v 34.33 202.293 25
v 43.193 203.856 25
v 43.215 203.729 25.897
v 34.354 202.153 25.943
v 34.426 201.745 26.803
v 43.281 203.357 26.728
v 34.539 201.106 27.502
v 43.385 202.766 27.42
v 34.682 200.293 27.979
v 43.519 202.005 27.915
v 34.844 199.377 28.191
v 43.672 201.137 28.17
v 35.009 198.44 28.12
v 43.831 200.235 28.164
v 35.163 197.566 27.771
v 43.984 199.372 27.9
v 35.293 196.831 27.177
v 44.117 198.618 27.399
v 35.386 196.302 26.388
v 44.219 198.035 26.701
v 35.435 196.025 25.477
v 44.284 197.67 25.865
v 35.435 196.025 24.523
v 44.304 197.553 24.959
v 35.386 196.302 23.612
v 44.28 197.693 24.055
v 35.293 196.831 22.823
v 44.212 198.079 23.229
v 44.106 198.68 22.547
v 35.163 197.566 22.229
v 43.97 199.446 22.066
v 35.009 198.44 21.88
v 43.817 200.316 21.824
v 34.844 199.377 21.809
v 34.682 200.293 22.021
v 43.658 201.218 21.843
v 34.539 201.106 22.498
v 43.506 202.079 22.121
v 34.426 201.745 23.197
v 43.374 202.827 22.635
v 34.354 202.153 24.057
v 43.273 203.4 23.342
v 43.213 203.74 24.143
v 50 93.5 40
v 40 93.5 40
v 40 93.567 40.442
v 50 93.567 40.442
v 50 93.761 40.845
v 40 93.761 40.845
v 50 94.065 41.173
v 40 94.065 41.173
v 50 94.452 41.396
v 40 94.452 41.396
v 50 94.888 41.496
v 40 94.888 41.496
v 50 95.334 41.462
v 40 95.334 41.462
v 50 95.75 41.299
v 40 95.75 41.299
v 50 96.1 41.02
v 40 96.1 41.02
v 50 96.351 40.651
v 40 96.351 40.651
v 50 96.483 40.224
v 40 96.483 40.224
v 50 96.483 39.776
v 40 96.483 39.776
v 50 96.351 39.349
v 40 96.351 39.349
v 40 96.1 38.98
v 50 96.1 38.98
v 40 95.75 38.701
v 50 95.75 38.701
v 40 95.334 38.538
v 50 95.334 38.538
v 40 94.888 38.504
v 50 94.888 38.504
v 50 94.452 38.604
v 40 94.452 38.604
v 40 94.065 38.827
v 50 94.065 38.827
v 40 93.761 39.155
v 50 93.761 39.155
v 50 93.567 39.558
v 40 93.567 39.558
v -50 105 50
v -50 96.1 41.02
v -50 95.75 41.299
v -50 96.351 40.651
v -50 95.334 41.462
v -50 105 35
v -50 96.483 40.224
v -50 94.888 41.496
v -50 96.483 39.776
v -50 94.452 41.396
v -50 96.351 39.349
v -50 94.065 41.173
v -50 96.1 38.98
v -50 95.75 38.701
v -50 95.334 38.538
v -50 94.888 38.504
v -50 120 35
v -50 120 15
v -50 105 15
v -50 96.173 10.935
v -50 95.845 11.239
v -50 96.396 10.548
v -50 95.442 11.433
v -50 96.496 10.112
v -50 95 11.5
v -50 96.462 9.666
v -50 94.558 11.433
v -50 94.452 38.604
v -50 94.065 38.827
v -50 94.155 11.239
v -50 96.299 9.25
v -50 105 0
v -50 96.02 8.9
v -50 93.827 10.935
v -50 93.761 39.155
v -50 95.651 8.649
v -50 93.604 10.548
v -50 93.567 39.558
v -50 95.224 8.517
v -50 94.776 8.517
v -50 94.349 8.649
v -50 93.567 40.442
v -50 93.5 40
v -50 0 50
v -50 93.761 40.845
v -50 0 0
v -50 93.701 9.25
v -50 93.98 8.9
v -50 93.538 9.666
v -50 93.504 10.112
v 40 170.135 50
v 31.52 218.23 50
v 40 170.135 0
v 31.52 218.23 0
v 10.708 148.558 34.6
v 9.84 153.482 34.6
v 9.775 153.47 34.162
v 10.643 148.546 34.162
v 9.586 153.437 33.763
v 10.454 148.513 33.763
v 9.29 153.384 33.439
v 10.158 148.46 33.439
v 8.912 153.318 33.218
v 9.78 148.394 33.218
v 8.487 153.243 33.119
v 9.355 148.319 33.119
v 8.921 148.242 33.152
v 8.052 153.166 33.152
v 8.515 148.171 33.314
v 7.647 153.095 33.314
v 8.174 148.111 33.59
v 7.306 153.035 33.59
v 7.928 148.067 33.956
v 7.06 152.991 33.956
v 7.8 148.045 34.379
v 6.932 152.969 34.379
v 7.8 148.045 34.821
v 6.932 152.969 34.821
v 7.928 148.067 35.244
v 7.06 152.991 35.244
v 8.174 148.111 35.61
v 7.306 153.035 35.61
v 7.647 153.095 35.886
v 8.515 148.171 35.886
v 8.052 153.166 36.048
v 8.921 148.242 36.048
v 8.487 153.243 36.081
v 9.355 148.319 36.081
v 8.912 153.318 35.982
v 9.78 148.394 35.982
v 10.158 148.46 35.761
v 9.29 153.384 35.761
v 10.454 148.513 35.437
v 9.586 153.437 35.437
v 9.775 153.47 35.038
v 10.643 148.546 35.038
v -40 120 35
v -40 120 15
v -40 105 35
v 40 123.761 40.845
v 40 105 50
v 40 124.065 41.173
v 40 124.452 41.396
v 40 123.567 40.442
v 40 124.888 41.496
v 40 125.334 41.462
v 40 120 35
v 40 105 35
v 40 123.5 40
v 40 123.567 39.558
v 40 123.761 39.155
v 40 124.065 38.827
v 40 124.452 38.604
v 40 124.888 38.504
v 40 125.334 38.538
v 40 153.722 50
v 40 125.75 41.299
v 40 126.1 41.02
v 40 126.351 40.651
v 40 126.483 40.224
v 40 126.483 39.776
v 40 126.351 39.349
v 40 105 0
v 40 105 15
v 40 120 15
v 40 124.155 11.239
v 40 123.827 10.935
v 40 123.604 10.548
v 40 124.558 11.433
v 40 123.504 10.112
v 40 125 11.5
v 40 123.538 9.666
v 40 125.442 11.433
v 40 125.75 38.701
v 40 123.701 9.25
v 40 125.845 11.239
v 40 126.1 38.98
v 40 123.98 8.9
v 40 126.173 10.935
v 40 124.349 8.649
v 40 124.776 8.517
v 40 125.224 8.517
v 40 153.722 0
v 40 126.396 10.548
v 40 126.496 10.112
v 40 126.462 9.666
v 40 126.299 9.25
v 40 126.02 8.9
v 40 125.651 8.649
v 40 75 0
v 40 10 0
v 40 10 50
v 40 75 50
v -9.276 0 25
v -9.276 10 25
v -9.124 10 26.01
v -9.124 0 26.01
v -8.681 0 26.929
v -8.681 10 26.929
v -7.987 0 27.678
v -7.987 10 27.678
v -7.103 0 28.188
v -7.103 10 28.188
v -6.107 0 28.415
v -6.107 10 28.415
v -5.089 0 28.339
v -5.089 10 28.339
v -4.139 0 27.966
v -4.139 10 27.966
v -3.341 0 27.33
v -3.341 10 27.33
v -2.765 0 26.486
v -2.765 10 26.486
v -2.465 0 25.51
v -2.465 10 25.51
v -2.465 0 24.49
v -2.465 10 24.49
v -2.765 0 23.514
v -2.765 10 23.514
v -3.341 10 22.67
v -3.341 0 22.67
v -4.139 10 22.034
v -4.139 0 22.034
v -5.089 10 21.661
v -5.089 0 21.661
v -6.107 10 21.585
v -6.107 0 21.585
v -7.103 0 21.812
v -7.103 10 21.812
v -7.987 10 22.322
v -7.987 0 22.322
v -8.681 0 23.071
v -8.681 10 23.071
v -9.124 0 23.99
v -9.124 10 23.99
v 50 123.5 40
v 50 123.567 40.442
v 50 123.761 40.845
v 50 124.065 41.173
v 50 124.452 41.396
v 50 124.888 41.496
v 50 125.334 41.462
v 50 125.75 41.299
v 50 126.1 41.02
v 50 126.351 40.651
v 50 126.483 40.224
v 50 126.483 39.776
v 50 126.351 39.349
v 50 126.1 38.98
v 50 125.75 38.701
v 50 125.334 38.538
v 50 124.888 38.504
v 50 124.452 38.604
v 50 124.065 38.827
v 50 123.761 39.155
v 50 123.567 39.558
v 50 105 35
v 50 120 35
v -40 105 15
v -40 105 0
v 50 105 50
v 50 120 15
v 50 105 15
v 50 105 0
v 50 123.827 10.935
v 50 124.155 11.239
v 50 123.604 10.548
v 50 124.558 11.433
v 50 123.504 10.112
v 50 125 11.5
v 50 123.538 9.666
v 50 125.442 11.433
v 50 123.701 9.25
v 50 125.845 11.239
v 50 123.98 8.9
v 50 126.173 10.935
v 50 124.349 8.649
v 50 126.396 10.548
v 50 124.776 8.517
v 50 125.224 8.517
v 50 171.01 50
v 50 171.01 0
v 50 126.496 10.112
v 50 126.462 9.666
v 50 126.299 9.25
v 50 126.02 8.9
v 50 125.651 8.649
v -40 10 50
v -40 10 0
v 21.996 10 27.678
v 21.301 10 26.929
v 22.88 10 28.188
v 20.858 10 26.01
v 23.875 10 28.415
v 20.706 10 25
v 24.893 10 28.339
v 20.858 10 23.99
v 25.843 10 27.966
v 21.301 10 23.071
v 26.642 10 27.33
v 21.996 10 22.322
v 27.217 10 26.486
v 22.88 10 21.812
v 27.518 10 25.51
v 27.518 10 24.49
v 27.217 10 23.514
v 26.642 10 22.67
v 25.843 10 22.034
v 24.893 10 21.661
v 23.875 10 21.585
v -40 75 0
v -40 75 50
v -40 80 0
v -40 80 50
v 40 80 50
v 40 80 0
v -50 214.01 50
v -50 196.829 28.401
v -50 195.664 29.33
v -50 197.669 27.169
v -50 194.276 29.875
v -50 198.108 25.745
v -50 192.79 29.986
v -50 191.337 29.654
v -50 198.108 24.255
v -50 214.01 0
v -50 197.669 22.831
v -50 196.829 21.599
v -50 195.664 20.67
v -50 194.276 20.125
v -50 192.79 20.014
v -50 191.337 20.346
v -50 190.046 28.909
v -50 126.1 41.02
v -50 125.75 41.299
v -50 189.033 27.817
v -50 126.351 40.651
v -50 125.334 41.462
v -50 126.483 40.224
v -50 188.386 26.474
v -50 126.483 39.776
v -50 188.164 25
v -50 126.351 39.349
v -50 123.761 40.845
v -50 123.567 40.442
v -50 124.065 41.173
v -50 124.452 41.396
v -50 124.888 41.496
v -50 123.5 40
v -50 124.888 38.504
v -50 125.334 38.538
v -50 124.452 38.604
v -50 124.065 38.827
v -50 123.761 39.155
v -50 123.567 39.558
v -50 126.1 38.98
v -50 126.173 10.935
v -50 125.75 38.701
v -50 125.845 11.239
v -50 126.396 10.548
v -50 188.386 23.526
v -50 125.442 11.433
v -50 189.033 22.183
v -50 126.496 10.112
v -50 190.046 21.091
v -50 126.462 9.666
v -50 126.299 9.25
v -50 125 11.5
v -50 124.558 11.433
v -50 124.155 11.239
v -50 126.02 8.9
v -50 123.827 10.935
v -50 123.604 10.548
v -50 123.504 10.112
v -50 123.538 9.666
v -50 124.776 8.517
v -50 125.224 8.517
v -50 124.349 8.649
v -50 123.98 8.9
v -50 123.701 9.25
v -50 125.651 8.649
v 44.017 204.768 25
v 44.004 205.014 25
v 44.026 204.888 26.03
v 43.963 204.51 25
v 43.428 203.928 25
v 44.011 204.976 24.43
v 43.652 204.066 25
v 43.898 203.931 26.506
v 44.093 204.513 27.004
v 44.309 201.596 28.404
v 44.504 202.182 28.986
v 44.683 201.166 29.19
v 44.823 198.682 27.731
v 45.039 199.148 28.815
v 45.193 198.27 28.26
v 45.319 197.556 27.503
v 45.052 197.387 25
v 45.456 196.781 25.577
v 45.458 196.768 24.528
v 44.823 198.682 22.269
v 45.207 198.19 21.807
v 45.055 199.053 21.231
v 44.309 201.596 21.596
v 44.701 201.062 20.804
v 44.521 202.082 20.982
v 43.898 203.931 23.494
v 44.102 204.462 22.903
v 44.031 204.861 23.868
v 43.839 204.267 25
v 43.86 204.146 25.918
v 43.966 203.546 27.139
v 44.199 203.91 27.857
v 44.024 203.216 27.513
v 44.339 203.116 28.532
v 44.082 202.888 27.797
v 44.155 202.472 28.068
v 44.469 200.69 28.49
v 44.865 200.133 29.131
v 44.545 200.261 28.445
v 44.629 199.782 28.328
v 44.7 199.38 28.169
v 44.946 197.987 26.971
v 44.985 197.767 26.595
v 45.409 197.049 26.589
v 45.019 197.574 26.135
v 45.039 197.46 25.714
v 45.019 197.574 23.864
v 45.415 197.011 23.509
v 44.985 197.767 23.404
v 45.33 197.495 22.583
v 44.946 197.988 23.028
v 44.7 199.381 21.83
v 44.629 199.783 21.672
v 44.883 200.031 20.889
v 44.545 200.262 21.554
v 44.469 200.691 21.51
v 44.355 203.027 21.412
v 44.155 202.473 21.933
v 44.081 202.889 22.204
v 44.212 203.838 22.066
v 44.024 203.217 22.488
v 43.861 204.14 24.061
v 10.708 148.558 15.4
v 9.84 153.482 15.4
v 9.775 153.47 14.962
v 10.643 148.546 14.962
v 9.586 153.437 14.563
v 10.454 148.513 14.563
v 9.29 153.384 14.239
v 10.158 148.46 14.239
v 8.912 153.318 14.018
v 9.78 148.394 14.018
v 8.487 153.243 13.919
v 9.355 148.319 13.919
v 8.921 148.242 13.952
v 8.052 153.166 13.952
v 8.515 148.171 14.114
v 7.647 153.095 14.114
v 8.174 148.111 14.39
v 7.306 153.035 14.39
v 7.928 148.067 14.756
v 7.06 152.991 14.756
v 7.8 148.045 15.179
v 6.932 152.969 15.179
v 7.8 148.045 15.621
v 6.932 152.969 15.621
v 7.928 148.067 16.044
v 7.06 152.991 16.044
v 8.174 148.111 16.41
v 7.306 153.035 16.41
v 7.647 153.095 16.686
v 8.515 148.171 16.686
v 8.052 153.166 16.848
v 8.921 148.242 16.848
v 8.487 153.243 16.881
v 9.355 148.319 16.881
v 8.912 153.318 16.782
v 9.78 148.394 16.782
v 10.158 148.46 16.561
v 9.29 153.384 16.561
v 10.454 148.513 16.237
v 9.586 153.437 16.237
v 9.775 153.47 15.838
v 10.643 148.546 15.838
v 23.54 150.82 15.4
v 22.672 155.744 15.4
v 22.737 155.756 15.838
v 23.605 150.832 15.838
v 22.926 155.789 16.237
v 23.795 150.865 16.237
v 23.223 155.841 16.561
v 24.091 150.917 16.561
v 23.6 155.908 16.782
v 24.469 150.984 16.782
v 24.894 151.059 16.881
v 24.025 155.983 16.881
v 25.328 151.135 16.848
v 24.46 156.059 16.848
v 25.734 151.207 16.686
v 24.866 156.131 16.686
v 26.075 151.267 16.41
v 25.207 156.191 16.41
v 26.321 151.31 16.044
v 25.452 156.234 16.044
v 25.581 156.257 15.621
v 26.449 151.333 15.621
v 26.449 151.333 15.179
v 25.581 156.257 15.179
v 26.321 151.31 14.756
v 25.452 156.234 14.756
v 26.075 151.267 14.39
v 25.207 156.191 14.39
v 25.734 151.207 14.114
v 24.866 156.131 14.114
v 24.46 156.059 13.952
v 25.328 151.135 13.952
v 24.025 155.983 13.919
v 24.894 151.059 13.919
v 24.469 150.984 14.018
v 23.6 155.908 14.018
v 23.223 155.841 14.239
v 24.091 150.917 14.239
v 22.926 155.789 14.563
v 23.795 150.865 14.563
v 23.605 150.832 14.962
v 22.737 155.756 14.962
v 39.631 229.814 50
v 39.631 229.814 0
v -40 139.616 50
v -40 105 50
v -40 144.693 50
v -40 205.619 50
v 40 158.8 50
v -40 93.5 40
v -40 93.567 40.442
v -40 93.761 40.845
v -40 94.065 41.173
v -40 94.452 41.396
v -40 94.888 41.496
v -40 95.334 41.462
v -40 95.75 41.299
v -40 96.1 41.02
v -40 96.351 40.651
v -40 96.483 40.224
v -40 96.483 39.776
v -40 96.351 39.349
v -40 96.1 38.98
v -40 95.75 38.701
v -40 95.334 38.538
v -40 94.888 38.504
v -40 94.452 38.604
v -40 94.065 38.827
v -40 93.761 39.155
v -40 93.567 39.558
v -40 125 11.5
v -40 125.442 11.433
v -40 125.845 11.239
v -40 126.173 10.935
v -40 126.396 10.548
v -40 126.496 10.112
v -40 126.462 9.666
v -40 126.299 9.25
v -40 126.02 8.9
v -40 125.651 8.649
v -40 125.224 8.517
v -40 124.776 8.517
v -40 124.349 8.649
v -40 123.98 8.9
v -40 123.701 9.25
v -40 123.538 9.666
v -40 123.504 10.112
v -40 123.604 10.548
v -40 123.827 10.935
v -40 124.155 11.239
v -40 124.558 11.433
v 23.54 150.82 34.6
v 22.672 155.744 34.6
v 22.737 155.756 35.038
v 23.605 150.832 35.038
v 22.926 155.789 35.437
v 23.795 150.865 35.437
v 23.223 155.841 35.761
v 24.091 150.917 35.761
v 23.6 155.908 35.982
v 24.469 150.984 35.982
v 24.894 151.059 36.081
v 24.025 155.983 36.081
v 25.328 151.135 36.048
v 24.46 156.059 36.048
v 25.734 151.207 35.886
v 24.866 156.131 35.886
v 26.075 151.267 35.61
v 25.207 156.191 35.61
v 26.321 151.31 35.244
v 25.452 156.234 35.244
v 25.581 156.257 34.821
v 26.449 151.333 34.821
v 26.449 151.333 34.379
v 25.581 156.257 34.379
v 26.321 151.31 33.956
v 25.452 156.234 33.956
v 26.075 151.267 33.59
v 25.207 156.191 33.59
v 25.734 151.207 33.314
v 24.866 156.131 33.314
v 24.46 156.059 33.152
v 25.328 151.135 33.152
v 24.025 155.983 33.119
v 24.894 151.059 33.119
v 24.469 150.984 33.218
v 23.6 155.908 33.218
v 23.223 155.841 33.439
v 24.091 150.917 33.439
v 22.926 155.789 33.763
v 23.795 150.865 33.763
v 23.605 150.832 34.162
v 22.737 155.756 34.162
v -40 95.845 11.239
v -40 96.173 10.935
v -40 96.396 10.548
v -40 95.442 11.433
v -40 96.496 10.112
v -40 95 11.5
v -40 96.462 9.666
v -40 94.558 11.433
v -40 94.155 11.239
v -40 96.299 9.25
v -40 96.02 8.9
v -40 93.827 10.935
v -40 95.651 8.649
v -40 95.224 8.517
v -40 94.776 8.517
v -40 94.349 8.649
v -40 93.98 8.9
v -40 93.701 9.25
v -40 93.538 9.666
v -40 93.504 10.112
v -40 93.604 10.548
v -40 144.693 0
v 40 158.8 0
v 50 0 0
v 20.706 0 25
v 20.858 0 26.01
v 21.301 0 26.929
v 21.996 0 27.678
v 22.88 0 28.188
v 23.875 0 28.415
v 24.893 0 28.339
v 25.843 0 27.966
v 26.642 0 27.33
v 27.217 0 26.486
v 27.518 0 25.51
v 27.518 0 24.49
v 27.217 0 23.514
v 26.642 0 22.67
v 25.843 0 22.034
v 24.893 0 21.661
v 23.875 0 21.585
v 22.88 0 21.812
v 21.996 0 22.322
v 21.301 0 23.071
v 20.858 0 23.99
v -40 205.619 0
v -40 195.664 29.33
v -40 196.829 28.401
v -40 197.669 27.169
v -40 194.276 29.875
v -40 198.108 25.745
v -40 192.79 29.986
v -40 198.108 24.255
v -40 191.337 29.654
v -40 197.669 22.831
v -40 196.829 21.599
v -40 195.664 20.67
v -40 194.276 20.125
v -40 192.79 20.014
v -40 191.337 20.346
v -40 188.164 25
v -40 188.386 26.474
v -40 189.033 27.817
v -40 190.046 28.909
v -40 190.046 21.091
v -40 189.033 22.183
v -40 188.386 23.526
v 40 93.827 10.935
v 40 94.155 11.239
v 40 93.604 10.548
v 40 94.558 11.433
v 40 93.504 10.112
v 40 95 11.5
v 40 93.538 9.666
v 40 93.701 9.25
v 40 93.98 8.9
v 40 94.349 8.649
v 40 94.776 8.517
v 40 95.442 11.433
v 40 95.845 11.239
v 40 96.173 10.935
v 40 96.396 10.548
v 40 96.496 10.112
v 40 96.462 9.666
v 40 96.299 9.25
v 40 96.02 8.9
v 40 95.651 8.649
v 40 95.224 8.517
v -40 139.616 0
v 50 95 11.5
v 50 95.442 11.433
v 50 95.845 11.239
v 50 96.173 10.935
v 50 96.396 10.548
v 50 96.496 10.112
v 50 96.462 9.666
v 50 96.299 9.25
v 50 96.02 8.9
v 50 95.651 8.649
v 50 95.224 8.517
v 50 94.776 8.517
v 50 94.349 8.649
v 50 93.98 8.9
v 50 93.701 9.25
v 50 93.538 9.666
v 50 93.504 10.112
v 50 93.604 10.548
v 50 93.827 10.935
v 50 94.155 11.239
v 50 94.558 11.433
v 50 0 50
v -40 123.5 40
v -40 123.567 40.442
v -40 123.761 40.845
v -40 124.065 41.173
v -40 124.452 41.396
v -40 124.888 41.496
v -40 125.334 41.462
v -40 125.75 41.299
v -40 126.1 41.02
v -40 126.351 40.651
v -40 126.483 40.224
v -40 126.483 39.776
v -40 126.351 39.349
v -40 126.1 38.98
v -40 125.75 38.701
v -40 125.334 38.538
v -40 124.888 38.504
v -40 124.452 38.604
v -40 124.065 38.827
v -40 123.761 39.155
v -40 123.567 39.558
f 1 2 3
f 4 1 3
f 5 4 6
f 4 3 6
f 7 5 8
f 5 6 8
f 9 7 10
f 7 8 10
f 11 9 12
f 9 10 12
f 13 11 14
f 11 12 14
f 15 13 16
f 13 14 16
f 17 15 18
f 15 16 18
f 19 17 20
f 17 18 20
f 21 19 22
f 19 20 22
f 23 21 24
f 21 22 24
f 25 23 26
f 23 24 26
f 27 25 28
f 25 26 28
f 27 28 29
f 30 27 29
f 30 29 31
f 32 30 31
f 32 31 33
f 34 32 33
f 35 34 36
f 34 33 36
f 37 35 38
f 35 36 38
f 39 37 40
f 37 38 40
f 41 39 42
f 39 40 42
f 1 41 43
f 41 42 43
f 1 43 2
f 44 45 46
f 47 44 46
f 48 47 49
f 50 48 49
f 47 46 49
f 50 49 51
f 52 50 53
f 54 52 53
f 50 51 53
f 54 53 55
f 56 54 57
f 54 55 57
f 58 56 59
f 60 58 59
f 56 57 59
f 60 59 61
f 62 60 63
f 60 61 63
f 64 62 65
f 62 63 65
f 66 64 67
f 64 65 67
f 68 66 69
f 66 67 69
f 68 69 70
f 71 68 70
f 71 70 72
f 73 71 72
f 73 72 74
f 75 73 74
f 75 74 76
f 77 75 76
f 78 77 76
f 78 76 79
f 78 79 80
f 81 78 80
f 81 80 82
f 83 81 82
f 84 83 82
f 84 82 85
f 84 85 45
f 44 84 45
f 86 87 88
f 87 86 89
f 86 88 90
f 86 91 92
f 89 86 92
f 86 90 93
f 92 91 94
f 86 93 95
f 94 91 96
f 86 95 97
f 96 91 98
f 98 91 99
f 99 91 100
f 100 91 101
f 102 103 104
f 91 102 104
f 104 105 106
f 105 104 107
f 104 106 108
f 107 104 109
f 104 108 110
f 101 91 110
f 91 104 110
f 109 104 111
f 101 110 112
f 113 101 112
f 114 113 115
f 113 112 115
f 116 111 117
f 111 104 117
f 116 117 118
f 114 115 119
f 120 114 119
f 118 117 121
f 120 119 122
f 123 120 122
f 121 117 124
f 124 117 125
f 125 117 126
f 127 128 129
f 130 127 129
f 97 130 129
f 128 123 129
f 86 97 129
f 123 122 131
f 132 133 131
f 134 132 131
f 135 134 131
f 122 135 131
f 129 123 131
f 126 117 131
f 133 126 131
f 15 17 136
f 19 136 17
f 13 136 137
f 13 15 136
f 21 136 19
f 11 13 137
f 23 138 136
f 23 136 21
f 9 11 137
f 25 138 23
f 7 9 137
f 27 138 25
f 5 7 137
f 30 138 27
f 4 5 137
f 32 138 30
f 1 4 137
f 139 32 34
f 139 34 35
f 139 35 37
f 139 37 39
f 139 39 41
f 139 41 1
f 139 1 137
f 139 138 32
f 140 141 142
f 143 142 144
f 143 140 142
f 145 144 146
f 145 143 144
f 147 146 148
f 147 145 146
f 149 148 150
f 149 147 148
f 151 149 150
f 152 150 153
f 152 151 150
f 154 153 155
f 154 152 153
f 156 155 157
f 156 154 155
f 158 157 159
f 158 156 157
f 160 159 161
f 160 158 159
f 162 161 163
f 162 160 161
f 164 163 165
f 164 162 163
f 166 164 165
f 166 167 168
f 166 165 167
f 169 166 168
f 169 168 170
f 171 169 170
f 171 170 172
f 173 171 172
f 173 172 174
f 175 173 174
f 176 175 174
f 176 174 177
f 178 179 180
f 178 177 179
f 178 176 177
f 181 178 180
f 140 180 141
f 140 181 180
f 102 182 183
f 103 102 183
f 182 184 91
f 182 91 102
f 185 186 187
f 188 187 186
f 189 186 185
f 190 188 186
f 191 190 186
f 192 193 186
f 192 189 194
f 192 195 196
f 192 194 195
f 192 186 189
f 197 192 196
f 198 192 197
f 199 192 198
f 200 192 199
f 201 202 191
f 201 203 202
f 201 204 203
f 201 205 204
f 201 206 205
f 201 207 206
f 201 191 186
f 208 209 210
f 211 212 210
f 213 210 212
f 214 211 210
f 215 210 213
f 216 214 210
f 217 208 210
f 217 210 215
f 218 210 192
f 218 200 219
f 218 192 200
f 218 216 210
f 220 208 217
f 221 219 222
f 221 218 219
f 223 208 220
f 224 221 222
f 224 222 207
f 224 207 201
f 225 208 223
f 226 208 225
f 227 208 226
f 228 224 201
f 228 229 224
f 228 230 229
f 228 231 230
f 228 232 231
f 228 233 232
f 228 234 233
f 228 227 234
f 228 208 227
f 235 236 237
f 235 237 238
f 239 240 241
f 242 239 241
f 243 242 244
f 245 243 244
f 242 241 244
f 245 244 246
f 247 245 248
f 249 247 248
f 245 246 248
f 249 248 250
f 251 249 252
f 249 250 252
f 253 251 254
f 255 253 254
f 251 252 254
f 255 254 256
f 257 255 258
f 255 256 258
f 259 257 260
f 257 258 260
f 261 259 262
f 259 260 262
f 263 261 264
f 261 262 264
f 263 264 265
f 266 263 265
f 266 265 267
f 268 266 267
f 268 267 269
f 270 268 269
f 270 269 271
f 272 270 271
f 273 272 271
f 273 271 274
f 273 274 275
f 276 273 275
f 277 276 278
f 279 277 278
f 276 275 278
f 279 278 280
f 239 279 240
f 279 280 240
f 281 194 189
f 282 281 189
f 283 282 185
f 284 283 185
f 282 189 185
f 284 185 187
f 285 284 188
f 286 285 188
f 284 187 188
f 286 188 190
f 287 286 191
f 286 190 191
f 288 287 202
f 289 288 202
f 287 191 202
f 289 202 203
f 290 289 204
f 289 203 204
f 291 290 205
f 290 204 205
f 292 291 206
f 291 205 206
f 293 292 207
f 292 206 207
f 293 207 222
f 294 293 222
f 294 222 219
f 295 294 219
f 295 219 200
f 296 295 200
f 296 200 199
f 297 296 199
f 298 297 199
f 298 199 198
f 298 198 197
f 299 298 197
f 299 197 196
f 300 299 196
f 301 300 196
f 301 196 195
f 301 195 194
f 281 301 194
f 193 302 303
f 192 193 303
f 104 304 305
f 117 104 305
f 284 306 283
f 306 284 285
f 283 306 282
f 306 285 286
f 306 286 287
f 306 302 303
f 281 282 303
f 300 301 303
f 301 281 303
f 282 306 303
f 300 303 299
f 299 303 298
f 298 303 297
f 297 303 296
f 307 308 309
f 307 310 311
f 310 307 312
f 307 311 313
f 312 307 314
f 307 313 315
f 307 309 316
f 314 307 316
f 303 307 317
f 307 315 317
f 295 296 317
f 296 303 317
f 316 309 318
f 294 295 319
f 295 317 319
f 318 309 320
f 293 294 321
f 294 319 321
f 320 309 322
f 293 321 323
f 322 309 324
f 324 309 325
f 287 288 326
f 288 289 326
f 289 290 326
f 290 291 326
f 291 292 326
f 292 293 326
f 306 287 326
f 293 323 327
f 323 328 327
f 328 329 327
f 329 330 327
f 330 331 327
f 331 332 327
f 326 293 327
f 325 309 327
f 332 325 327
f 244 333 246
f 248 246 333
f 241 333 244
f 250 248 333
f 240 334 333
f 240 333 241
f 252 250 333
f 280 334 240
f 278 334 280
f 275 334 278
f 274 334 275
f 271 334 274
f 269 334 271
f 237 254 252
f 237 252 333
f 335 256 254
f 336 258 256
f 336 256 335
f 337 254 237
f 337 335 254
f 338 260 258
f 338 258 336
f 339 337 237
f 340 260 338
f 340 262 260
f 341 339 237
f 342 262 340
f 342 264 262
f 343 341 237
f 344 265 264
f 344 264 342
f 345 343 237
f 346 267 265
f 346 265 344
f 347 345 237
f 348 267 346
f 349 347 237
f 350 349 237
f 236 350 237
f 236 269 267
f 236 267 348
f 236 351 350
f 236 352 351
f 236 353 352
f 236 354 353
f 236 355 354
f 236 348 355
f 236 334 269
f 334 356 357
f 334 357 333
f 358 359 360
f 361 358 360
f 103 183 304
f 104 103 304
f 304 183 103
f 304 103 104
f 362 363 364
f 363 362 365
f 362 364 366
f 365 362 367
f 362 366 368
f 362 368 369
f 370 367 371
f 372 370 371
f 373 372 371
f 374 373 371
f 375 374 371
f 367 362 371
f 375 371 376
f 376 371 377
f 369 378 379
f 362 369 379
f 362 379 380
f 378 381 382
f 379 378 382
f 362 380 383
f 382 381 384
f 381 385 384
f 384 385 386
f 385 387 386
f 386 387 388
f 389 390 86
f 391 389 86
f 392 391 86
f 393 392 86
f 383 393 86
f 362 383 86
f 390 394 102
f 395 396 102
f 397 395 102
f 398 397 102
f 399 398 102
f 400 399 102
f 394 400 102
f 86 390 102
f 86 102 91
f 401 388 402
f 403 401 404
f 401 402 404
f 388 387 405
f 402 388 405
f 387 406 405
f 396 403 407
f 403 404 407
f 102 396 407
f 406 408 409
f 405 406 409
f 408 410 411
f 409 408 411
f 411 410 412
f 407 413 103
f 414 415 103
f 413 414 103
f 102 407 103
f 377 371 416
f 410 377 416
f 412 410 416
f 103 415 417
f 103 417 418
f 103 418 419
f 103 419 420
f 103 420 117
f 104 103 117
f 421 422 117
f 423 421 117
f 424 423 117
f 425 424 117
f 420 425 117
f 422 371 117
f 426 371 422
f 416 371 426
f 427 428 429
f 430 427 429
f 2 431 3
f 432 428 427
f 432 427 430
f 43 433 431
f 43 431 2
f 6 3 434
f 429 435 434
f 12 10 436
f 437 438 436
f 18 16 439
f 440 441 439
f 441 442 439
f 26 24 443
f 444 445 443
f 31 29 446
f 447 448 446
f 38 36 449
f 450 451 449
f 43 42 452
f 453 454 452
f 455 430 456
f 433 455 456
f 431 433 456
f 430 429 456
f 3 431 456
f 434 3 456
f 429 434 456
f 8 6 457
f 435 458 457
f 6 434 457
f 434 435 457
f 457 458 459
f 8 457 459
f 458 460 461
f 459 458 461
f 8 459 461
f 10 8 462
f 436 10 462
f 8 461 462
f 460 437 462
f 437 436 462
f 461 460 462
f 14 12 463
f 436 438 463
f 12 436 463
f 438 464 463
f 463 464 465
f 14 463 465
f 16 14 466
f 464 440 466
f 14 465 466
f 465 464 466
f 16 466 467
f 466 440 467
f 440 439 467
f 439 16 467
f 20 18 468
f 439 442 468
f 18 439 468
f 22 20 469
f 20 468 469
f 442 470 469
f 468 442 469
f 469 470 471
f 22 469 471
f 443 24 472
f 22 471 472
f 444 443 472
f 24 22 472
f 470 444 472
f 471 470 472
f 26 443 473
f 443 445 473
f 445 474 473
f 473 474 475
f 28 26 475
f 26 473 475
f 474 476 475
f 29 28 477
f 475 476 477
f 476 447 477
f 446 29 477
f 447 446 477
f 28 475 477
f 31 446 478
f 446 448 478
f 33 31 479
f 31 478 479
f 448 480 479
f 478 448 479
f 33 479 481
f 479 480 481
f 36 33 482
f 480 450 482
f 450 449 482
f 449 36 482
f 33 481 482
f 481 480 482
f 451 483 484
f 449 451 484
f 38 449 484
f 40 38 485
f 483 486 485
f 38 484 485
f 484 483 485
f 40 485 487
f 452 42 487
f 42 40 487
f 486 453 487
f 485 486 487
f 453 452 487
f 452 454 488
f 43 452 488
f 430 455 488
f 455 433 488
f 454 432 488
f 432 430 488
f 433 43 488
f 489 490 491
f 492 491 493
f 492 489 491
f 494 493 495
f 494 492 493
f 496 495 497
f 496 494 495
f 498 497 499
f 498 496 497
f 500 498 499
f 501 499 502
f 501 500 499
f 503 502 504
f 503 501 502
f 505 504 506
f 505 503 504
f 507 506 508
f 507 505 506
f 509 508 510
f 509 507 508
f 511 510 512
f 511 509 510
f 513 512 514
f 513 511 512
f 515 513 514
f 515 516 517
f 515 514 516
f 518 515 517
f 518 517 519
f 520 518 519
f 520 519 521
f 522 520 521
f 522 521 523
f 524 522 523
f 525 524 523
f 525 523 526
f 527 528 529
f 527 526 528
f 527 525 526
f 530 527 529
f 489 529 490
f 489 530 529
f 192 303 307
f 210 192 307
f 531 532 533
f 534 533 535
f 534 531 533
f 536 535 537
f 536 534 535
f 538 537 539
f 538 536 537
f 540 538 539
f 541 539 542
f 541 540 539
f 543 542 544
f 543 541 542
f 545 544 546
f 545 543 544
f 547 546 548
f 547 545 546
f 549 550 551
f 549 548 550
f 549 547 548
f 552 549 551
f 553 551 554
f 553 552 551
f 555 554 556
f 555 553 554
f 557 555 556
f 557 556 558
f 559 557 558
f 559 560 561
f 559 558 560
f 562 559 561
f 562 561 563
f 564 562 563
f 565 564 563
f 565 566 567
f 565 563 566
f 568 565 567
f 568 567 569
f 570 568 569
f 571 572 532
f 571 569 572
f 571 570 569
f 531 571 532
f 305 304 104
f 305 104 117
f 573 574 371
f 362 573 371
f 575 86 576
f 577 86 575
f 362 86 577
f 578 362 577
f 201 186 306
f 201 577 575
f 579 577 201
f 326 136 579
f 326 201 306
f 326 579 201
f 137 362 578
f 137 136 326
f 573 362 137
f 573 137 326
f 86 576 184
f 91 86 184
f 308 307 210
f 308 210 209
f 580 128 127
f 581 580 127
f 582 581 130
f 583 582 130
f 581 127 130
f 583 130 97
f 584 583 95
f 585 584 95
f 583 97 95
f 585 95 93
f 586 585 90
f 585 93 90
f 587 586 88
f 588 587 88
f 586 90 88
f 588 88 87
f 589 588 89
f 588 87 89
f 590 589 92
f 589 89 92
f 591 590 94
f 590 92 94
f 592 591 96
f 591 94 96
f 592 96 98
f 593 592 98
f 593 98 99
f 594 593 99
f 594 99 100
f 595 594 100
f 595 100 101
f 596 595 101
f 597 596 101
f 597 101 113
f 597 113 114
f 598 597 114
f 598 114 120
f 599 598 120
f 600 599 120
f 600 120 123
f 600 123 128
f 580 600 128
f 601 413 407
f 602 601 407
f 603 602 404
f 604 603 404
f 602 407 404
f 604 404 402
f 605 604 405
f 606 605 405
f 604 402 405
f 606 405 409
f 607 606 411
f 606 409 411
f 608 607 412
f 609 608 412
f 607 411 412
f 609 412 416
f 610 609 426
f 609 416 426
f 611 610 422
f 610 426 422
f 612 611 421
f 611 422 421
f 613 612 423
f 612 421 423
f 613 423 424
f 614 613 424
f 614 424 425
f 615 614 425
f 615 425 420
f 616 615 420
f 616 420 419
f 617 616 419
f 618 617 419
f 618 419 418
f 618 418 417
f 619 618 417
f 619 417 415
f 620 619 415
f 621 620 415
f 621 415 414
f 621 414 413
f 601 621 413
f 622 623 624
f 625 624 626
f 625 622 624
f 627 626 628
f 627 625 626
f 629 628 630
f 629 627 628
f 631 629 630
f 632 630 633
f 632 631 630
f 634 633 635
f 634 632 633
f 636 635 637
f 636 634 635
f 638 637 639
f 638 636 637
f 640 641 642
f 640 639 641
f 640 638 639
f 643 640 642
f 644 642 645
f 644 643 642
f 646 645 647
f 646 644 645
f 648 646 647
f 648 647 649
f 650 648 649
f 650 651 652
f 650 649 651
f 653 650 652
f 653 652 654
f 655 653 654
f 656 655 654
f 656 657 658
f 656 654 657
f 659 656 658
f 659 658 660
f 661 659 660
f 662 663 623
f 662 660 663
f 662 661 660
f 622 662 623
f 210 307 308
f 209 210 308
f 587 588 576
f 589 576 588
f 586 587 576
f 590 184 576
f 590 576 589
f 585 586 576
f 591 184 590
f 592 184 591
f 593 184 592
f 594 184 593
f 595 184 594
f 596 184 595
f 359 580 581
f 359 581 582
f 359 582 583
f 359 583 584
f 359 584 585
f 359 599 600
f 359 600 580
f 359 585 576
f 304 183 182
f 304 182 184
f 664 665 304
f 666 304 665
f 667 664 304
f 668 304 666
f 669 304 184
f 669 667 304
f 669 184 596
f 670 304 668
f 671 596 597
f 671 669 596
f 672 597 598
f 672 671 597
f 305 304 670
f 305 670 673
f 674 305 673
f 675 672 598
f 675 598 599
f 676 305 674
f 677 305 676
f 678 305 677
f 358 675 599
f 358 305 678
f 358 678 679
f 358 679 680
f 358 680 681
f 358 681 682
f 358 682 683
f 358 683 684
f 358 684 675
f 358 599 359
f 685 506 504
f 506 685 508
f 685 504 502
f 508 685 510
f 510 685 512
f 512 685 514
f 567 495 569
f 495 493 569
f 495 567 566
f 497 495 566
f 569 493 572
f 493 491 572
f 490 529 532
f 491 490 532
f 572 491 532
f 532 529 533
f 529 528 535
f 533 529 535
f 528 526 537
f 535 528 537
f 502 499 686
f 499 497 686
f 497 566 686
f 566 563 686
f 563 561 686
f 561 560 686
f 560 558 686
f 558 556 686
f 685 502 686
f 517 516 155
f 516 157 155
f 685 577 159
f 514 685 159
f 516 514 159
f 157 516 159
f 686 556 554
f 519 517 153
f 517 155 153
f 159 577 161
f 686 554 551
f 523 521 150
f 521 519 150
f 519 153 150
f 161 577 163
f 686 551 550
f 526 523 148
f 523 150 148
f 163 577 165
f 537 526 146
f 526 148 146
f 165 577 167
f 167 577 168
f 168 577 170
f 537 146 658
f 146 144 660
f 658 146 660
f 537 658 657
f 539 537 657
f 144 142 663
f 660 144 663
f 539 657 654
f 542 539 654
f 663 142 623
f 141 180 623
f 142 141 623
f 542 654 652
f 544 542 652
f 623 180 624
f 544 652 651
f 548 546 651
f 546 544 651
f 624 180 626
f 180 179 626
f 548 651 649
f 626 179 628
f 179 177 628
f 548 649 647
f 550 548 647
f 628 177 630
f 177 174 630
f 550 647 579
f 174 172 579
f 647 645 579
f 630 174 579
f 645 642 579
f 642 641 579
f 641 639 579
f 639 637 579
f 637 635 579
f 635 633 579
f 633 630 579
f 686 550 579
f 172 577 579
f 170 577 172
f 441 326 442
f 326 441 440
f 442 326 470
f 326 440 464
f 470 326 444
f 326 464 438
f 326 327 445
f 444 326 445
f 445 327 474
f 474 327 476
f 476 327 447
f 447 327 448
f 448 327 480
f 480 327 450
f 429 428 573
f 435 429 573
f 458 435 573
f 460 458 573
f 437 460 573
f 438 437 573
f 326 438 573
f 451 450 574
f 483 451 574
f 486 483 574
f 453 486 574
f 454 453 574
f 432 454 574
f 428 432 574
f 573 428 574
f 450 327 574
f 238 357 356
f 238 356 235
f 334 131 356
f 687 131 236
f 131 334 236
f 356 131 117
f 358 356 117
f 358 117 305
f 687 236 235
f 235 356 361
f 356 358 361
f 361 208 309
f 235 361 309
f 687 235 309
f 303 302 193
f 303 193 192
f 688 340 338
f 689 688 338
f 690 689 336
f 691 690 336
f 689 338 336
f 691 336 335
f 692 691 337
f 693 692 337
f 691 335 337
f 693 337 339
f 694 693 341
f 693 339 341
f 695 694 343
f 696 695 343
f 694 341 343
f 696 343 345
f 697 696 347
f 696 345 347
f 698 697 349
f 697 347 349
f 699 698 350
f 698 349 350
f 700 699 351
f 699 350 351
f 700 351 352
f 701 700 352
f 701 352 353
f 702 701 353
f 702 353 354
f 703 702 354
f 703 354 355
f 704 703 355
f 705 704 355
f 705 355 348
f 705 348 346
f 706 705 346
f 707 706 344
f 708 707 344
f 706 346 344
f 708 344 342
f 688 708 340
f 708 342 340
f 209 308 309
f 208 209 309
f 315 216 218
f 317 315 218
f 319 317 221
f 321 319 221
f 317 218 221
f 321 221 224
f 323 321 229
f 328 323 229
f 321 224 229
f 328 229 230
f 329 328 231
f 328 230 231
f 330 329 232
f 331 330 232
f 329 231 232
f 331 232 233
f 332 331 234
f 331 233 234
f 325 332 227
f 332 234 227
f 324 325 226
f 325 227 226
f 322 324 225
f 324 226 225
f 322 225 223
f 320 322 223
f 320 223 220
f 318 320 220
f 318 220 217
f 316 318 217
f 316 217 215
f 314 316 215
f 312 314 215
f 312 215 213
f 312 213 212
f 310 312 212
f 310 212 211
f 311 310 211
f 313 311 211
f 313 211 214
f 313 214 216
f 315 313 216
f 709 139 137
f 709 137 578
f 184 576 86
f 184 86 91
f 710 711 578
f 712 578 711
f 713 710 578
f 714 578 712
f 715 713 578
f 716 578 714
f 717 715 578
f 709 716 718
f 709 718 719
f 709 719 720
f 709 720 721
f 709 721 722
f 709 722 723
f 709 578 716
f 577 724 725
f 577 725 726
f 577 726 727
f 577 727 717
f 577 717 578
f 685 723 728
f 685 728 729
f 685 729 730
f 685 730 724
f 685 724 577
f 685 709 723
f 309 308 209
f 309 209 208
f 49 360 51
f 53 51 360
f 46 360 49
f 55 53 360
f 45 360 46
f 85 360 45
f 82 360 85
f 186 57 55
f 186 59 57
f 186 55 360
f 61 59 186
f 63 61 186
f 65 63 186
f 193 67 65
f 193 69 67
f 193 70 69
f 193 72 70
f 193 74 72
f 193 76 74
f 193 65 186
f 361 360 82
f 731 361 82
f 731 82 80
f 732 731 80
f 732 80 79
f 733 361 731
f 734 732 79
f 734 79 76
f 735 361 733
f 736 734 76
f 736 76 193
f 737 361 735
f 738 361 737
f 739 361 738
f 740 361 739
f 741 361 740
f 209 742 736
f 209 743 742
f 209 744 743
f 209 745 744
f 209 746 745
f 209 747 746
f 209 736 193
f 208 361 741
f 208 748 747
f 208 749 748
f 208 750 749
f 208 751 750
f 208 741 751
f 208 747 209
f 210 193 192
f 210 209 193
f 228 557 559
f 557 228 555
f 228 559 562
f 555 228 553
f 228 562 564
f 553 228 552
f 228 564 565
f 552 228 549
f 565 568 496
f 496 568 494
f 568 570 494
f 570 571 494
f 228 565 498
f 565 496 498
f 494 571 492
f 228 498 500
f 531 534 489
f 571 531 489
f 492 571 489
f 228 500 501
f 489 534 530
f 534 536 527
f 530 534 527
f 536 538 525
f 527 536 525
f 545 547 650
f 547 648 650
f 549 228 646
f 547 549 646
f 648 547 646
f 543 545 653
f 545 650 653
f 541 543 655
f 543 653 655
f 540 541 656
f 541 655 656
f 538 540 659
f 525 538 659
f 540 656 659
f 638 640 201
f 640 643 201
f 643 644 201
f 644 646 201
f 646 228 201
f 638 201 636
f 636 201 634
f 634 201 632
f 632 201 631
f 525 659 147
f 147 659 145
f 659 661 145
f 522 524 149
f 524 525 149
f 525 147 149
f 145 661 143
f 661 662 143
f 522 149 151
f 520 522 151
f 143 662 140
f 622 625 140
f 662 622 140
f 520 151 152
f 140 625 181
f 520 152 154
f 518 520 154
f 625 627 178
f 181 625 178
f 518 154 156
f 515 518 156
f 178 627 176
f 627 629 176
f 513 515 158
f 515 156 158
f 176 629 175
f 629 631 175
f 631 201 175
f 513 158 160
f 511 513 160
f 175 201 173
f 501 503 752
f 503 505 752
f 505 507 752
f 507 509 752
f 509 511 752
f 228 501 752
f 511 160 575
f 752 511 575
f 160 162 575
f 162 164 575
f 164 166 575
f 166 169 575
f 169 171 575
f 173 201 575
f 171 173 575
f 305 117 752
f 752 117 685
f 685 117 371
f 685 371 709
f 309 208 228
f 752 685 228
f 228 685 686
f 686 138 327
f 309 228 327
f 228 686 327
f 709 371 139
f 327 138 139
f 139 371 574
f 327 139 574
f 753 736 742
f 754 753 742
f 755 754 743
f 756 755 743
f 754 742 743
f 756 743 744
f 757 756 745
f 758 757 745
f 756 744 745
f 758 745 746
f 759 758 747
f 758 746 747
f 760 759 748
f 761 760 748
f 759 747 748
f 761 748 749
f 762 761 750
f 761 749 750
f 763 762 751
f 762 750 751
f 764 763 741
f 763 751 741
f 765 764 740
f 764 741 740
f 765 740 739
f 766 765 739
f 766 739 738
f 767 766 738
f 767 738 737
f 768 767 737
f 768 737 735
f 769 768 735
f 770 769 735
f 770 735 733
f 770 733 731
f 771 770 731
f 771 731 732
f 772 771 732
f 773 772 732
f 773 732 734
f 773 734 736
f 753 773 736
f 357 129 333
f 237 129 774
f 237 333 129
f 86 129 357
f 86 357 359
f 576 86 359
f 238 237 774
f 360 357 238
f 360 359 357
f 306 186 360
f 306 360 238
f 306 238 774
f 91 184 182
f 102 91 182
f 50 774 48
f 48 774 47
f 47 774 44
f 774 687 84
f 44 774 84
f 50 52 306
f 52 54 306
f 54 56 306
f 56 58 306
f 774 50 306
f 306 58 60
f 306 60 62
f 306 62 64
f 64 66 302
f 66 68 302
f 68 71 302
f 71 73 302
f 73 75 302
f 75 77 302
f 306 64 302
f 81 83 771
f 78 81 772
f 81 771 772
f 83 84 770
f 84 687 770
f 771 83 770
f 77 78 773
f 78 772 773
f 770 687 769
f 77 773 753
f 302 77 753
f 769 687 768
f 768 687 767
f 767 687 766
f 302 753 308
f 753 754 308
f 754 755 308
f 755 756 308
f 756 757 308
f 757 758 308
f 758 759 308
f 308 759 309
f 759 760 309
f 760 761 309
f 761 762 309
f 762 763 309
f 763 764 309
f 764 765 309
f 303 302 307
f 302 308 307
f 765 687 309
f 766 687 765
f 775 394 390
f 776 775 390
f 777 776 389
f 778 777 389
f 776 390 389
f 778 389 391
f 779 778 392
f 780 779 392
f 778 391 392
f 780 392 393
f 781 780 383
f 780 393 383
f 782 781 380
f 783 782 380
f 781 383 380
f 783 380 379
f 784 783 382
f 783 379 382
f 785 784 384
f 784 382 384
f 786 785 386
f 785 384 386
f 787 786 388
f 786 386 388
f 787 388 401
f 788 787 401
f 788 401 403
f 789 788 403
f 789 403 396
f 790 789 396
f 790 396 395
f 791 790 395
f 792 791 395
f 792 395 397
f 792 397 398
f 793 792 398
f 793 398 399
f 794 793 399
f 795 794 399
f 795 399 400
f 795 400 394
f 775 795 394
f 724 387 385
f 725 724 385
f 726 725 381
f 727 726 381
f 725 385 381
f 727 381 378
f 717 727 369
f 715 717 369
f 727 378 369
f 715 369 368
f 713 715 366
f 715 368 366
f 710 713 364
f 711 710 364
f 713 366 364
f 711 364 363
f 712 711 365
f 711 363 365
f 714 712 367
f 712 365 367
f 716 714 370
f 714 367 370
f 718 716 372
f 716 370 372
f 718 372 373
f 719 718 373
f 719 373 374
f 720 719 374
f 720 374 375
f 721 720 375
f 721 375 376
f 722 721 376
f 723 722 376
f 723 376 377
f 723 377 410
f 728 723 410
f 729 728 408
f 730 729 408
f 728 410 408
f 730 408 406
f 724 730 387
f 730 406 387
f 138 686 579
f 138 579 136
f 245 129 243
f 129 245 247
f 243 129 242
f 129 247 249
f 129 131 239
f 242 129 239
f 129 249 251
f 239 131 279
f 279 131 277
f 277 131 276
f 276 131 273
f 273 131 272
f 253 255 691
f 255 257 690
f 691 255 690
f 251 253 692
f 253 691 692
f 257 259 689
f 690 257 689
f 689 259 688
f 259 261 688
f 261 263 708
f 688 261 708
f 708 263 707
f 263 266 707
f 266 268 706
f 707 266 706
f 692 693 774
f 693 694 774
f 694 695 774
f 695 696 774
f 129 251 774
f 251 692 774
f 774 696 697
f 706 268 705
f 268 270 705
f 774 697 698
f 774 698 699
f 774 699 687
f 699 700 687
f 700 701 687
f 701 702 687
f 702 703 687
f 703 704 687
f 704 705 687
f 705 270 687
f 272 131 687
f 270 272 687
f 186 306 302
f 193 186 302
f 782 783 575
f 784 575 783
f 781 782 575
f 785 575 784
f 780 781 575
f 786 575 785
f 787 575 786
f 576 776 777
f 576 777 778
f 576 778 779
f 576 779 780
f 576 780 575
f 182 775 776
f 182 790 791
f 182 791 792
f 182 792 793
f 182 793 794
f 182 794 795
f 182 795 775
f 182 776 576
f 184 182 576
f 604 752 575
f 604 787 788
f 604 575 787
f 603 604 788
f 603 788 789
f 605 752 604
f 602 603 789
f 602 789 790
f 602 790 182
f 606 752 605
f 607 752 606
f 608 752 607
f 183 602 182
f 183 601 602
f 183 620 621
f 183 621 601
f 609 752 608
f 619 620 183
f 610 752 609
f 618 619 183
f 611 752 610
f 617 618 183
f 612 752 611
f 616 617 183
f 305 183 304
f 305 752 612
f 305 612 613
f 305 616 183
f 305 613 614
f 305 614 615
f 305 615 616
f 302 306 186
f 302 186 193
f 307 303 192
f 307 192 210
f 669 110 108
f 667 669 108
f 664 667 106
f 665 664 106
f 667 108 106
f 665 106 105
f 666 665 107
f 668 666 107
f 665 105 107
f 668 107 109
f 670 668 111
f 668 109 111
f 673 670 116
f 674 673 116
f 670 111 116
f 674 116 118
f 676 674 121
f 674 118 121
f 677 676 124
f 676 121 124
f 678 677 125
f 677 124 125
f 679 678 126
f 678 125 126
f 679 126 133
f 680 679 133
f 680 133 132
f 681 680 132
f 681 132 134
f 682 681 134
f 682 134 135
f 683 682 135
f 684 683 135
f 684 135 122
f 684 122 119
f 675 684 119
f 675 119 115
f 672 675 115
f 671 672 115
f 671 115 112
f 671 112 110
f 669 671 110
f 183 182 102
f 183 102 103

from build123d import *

# Parameters (mm, degrees)
BOSS_EXTRUDE1_DEPTH    = 50
SKETCH4_R              = 3.2
CUT_EXTRUDE1_DEPTH     = 10
BOSS_EXTRUDE2_DEPTH    = 50
SKETCH8_R              = 5
CUT_EXTRUDE3_DEPTH     = 10
CUT_EXTRUDE4_REACH     = 254.527
SKETCH9_R              = 1.485
SKETCH10_R             = 3.425
CUT_EXTRUDE5_DEPTH     = 10
SKETCH11_W             = 80
SKETCH11_H             = 5
BOSS_EXTRUDE3_DEPTH    = 50
FILLET1_R              = 1
SKETCH13_R             = 1.5
CUT_EXTRUDE6_DEPTH     = 256.567325306
SPLIT1_SURFACE_1_BACK  = 256.567
SPLIT1_SURFACE_1_DEPTH = 513.134
SPLIT1_SURFACE_2_BACK  = 256.567
SPLIT1_SURFACE_2_DEPTH = 513.134


with BuildPart() as part:
    # Sketch2 → Boss-Extrude1 (new body)
    with BuildSketch(Plane.XY):
        Polygon((-50, 214.01), (-50, 0), (50, 0), (50, 171.01), (39.631197958, 229.814398513), align=None)
        Polygon((-40, 205.619003688), (-40, 10), (40, 10), (40, 170.135113365), (31.519602204, 218.229839206), align=None, mode=Mode.SUBTRACT)
    extrude(amount=BOSS_EXTRUDE1_DEPTH)

    # Sketch4 → Cut-Extrude1 (cut)
    with BuildSketch(Plane(origin=(77.736747875, 13.707086043, 0), x_dir=(0, 0, -1), z_dir=(0.9848077530122079, 0.17364817766693136, 0))):
        with Locations(Location((-25, 190.058116105, 0), (0, 0, 90))):
            Circle(SKETCH4_R)
    extrude(amount=-CUT_EXTRUDE1_DEPTH, mode=Mode.SUBTRACT)

    # Sketch7 → Boss-Extrude2 (add)
    with BuildSketch(Plane.XY.offset(50)):
        Polygon((40, 158.799565432), (40, 153.722432372), (-40, 139.616273916), (-40, 144.693406975), align=None)
    extrude(amount=-BOSS_EXTRUDE2_DEPTH)

    # Sketch8 → Cut-Extrude3 (cut)
    with BuildSketch(Plane.ZY.offset(50)):
        with Locations(Location((25, 193.163858422, 0), (0, 0, 270))):
            Circle(SKETCH8_R)
    extrude(amount=-CUT_EXTRUDE3_DEPTH, mode=Mode.SUBTRACT)

    # Sketch9 → Cut-Extrude4 (cut, up to next)
    with BuildSketch(Plane(origin=(130.25849011, 169.637439417, 0), x_dir=(-0.9848077530122079, -0.17364817766693152, 0), z_dir=(-0.17364817766693152, 0.9848077530122079, 0)), mode=Mode.PRIVATE) as cut_extrude4_sk1:
        with Locations((106.879323392, 15.4)):
            Circle(SKETCH9_R)
    cut_extrude4_tool1 = extrude(cut_extrude4_sk1.sketch, amount=CUT_EXTRUDE4_REACH, mode=Mode.PRIVATE) & part.part
    # Sketch9 → Cut-Extrude4 (cut, up to next)
    with BuildSketch(Plane(origin=(130.25849011, 169.637439417, 0), x_dir=(-0.9848077530122079, -0.17364817766693152, 0), z_dir=(-0.17364817766693152, 0.9848077530122079, 0)), mode=Mode.PRIVATE) as cut_extrude4_sk2:
        with Locations((106.879323392, 34.6)):
            Circle(SKETCH9_R)
    cut_extrude4_tool2 = extrude(cut_extrude4_sk2.sketch, amount=CUT_EXTRUDE4_REACH, mode=Mode.PRIVATE) & part.part
    # Sketch9 → Cut-Extrude4 (cut, up to next)
    with BuildSketch(Plane(origin=(130.25849011, 169.637439417, 0), x_dir=(-0.9848077530122079, -0.17364817766693152, 0), z_dir=(-0.17364817766693152, 0.9848077530122079, 0)), mode=Mode.PRIVATE) as cut_extrude4_sk3:
        with Locations(Location((122.879323392, 34.6, 0), (0, 0, 180))):
            Circle(SKETCH9_R)
    cut_extrude4_tool3 = extrude(cut_extrude4_sk3.sketch, amount=CUT_EXTRUDE4_REACH, mode=Mode.PRIVATE) & part.part
    # Sketch9 → Cut-Extrude4 (cut, up to next)
    with BuildSketch(Plane(origin=(130.25849011, 169.637439417, 0), x_dir=(-0.9848077530122079, -0.17364817766693152, 0), z_dir=(-0.17364817766693152, 0.9848077530122079, 0)), mode=Mode.PRIVATE) as cut_extrude4_sk4:
        with Locations(Location((122.879323392, 15.4, 0), (0, 0, 180))):
            Circle(SKETCH9_R)
    cut_extrude4_tool4 = extrude(cut_extrude4_sk4.sketch, amount=CUT_EXTRUDE4_REACH, mode=Mode.PRIVATE) & part.part
    add(cut_extrude4_tool1.solids().sort_by_distance((25.002904, 151.07804, 15.4))[0], mode=Mode.SUBTRACT)
    add(cut_extrude4_tool2.solids().sort_by_distance((25.002904, 151.07804, 34.6))[0], mode=Mode.SUBTRACT)
    add(cut_extrude4_tool3.solids().sort_by_distance((9.24598, 148.299669, 34.6))[0], mode=Mode.SUBTRACT)
    add(cut_extrude4_tool4.solids().sort_by_distance((9.24598, 148.299669, 15.4))[0], mode=Mode.SUBTRACT)

    # Sketch10 → Cut-Extrude5 (cut)
    with BuildSketch(Plane(origin=(0, 10, 0), x_dir=(1, 0, 0), z_dir=(0, 1, 0))):
        with Locations(Location((-5.851287133, -25, 0), (0, 0, 180))):
            Circle(SKETCH10_R)
        with Locations(Location((24.130974018, -25, 0), (0, 0, 180))):
            Circle(SKETCH10_R)
    extrude(amount=-CUT_EXTRUDE5_DEPTH, mode=Mode.SUBTRACT)

    # Sketch11 → Boss-Extrude3 (add)
    with BuildSketch(Plane.XY.offset(50)):
        with Locations((0, 77.5)):
            Rectangle(SKETCH11_W, SKETCH11_H)
    extrude(amount=-BOSS_EXTRUDE3_DEPTH)

    # Fillet1
    fillet1_edges = [part.edges().sort_by_distance(p)[0] for p in [
        (45.289176531, 197.726407497, 25),
    ]]
    fillet(fillet1_edges, radius=FILLET1_R)

    # Sketch13 → Cut-Extrude6 (cut, through all)
    with BuildSketch(Plane.ZY.offset(50)):
        with Locations(Location((40, 125, 0), (0, 0, 270))):
            Circle(SKETCH13_R)
        with Locations(Location((40, 95, 0), (0, 0, 270))):
            Circle(SKETCH13_R)
        with Locations((10, 95)):
            Circle(SKETCH13_R)
        with Locations((10, 125)):
            Circle(SKETCH13_R)
    extrude(amount=-CUT_EXTRUDE6_DEPTH, mode=Mode.SUBTRACT)


with BuildPart() as body_2:
    # Split1: the piece behind the surface
    add(part.part)
    # Split1 surface: a surface, the sketch's curves swept straight by 513.134 mm
    with BuildLine(Plane.ZY.offset(50).offset(-SPLIT1_SURFACE_1_BACK), mode=Mode.PRIVATE) as split1_surface_1_path:
        Line((50, 105), (35, 105))
        Line((35, 105), (35, 120))
        Line((35, 120), (15, 120))
        Line((15, 120), (15, 105))
        Line((15, 105), (0, 105))
    split1_surface_1 = Shell.extrude(split1_surface_1_path.wire(), (-1 * SPLIT1_SURFACE_1_DEPTH, 0 * SPLIT1_SURFACE_1_DEPTH, 0 * SPLIT1_SURFACE_1_DEPTH))
    split(bisect_by=split1_surface_1, keep=Keep.BOTTOM)


with BuildPart() as part_1:
    add(part.part)

    # Split1: split by a surface, the side it looks to stays
    # Split1 surface: a surface, the sketch's curves swept straight by 513.134 mm
    with BuildLine(Plane.ZY.offset(50).offset(-SPLIT1_SURFACE_2_BACK), mode=Mode.PRIVATE) as split1_surface_2_path:
        Line((50, 105), (35, 105))
        Line((35, 105), (35, 120))
        Line((35, 120), (15, 120))
        Line((15, 120), (15, 105))
        Line((15, 105), (0, 105))
    split1_surface_2 = Shell.extrude(split1_surface_2_path.wire(), (-1 * SPLIT1_SURFACE_2_DEPTH, 0 * SPLIT1_SURFACE_2_DEPTH, 0 * SPLIT1_SURFACE_2_DEPTH))
    split(bisect_by=split1_surface_2, keep=Keep.TOP)


solid = Compound([body_2.part, part_1.part])
